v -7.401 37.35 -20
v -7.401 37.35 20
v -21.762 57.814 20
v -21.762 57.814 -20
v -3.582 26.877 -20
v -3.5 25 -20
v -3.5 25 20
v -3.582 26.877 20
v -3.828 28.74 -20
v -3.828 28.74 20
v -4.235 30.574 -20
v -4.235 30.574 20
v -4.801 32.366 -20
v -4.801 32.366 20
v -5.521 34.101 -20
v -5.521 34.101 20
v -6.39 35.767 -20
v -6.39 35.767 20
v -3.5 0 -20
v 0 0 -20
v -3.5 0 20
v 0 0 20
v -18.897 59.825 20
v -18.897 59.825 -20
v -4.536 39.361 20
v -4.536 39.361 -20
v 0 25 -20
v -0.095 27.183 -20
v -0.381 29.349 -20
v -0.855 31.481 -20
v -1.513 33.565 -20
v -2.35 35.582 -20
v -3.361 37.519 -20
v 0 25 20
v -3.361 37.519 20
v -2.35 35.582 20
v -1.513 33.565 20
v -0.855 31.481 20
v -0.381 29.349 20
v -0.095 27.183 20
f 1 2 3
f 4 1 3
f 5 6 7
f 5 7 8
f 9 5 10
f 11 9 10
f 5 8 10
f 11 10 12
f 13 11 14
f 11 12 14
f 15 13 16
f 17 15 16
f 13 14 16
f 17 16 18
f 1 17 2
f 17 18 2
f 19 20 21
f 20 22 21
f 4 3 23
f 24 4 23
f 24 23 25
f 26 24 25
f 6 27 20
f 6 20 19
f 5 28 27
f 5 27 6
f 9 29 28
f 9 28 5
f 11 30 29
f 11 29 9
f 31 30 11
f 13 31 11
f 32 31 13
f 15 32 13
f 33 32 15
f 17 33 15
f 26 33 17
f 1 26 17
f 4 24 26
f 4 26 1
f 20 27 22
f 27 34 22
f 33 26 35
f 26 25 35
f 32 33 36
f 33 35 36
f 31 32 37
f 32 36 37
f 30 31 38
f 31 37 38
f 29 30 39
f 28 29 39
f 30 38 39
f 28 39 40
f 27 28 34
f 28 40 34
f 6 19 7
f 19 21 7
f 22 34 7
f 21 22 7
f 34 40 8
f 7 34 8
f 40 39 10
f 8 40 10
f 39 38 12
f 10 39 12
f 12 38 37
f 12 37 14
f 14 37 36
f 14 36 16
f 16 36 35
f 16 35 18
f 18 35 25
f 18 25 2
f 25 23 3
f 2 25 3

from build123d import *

# Parameters (mm, degrees)
EXTRUIR_L_MINA1_DEPTH = 20


with BuildPart() as part:
    # Croquis1 → Extruir-Lámina1 (new body, symmetric)
    with BuildSketch(Plane.XY):
        with BuildLine():
            Line((-18.897074708, 59.824622078), (-4.536226315, 39.360848393))
            ThreePointArc((-4.536226315, 39.360848393), (-1.161015729, 32.530128082), (0, 25))
            Line((0, 25), (0, 0))
            Line((0, 0), (-3.5, 0))
            Line((-3.5, 0), (-3.5, 25))
            ThreePointArc((-3.5, 25), (-4.498473527, 31.475910151), (-7.401154631, 37.350329618))
            Line((-7.401154631, 37.350329618), (-21.762003023, 57.814103303))
            Line((-21.762003023, 57.814103303), (-18.897074708, 59.824622078))
        make_face()
    extrude(amount=EXTRUIR_L_MINA1_DEPTH, both=True)


solid = part.part
